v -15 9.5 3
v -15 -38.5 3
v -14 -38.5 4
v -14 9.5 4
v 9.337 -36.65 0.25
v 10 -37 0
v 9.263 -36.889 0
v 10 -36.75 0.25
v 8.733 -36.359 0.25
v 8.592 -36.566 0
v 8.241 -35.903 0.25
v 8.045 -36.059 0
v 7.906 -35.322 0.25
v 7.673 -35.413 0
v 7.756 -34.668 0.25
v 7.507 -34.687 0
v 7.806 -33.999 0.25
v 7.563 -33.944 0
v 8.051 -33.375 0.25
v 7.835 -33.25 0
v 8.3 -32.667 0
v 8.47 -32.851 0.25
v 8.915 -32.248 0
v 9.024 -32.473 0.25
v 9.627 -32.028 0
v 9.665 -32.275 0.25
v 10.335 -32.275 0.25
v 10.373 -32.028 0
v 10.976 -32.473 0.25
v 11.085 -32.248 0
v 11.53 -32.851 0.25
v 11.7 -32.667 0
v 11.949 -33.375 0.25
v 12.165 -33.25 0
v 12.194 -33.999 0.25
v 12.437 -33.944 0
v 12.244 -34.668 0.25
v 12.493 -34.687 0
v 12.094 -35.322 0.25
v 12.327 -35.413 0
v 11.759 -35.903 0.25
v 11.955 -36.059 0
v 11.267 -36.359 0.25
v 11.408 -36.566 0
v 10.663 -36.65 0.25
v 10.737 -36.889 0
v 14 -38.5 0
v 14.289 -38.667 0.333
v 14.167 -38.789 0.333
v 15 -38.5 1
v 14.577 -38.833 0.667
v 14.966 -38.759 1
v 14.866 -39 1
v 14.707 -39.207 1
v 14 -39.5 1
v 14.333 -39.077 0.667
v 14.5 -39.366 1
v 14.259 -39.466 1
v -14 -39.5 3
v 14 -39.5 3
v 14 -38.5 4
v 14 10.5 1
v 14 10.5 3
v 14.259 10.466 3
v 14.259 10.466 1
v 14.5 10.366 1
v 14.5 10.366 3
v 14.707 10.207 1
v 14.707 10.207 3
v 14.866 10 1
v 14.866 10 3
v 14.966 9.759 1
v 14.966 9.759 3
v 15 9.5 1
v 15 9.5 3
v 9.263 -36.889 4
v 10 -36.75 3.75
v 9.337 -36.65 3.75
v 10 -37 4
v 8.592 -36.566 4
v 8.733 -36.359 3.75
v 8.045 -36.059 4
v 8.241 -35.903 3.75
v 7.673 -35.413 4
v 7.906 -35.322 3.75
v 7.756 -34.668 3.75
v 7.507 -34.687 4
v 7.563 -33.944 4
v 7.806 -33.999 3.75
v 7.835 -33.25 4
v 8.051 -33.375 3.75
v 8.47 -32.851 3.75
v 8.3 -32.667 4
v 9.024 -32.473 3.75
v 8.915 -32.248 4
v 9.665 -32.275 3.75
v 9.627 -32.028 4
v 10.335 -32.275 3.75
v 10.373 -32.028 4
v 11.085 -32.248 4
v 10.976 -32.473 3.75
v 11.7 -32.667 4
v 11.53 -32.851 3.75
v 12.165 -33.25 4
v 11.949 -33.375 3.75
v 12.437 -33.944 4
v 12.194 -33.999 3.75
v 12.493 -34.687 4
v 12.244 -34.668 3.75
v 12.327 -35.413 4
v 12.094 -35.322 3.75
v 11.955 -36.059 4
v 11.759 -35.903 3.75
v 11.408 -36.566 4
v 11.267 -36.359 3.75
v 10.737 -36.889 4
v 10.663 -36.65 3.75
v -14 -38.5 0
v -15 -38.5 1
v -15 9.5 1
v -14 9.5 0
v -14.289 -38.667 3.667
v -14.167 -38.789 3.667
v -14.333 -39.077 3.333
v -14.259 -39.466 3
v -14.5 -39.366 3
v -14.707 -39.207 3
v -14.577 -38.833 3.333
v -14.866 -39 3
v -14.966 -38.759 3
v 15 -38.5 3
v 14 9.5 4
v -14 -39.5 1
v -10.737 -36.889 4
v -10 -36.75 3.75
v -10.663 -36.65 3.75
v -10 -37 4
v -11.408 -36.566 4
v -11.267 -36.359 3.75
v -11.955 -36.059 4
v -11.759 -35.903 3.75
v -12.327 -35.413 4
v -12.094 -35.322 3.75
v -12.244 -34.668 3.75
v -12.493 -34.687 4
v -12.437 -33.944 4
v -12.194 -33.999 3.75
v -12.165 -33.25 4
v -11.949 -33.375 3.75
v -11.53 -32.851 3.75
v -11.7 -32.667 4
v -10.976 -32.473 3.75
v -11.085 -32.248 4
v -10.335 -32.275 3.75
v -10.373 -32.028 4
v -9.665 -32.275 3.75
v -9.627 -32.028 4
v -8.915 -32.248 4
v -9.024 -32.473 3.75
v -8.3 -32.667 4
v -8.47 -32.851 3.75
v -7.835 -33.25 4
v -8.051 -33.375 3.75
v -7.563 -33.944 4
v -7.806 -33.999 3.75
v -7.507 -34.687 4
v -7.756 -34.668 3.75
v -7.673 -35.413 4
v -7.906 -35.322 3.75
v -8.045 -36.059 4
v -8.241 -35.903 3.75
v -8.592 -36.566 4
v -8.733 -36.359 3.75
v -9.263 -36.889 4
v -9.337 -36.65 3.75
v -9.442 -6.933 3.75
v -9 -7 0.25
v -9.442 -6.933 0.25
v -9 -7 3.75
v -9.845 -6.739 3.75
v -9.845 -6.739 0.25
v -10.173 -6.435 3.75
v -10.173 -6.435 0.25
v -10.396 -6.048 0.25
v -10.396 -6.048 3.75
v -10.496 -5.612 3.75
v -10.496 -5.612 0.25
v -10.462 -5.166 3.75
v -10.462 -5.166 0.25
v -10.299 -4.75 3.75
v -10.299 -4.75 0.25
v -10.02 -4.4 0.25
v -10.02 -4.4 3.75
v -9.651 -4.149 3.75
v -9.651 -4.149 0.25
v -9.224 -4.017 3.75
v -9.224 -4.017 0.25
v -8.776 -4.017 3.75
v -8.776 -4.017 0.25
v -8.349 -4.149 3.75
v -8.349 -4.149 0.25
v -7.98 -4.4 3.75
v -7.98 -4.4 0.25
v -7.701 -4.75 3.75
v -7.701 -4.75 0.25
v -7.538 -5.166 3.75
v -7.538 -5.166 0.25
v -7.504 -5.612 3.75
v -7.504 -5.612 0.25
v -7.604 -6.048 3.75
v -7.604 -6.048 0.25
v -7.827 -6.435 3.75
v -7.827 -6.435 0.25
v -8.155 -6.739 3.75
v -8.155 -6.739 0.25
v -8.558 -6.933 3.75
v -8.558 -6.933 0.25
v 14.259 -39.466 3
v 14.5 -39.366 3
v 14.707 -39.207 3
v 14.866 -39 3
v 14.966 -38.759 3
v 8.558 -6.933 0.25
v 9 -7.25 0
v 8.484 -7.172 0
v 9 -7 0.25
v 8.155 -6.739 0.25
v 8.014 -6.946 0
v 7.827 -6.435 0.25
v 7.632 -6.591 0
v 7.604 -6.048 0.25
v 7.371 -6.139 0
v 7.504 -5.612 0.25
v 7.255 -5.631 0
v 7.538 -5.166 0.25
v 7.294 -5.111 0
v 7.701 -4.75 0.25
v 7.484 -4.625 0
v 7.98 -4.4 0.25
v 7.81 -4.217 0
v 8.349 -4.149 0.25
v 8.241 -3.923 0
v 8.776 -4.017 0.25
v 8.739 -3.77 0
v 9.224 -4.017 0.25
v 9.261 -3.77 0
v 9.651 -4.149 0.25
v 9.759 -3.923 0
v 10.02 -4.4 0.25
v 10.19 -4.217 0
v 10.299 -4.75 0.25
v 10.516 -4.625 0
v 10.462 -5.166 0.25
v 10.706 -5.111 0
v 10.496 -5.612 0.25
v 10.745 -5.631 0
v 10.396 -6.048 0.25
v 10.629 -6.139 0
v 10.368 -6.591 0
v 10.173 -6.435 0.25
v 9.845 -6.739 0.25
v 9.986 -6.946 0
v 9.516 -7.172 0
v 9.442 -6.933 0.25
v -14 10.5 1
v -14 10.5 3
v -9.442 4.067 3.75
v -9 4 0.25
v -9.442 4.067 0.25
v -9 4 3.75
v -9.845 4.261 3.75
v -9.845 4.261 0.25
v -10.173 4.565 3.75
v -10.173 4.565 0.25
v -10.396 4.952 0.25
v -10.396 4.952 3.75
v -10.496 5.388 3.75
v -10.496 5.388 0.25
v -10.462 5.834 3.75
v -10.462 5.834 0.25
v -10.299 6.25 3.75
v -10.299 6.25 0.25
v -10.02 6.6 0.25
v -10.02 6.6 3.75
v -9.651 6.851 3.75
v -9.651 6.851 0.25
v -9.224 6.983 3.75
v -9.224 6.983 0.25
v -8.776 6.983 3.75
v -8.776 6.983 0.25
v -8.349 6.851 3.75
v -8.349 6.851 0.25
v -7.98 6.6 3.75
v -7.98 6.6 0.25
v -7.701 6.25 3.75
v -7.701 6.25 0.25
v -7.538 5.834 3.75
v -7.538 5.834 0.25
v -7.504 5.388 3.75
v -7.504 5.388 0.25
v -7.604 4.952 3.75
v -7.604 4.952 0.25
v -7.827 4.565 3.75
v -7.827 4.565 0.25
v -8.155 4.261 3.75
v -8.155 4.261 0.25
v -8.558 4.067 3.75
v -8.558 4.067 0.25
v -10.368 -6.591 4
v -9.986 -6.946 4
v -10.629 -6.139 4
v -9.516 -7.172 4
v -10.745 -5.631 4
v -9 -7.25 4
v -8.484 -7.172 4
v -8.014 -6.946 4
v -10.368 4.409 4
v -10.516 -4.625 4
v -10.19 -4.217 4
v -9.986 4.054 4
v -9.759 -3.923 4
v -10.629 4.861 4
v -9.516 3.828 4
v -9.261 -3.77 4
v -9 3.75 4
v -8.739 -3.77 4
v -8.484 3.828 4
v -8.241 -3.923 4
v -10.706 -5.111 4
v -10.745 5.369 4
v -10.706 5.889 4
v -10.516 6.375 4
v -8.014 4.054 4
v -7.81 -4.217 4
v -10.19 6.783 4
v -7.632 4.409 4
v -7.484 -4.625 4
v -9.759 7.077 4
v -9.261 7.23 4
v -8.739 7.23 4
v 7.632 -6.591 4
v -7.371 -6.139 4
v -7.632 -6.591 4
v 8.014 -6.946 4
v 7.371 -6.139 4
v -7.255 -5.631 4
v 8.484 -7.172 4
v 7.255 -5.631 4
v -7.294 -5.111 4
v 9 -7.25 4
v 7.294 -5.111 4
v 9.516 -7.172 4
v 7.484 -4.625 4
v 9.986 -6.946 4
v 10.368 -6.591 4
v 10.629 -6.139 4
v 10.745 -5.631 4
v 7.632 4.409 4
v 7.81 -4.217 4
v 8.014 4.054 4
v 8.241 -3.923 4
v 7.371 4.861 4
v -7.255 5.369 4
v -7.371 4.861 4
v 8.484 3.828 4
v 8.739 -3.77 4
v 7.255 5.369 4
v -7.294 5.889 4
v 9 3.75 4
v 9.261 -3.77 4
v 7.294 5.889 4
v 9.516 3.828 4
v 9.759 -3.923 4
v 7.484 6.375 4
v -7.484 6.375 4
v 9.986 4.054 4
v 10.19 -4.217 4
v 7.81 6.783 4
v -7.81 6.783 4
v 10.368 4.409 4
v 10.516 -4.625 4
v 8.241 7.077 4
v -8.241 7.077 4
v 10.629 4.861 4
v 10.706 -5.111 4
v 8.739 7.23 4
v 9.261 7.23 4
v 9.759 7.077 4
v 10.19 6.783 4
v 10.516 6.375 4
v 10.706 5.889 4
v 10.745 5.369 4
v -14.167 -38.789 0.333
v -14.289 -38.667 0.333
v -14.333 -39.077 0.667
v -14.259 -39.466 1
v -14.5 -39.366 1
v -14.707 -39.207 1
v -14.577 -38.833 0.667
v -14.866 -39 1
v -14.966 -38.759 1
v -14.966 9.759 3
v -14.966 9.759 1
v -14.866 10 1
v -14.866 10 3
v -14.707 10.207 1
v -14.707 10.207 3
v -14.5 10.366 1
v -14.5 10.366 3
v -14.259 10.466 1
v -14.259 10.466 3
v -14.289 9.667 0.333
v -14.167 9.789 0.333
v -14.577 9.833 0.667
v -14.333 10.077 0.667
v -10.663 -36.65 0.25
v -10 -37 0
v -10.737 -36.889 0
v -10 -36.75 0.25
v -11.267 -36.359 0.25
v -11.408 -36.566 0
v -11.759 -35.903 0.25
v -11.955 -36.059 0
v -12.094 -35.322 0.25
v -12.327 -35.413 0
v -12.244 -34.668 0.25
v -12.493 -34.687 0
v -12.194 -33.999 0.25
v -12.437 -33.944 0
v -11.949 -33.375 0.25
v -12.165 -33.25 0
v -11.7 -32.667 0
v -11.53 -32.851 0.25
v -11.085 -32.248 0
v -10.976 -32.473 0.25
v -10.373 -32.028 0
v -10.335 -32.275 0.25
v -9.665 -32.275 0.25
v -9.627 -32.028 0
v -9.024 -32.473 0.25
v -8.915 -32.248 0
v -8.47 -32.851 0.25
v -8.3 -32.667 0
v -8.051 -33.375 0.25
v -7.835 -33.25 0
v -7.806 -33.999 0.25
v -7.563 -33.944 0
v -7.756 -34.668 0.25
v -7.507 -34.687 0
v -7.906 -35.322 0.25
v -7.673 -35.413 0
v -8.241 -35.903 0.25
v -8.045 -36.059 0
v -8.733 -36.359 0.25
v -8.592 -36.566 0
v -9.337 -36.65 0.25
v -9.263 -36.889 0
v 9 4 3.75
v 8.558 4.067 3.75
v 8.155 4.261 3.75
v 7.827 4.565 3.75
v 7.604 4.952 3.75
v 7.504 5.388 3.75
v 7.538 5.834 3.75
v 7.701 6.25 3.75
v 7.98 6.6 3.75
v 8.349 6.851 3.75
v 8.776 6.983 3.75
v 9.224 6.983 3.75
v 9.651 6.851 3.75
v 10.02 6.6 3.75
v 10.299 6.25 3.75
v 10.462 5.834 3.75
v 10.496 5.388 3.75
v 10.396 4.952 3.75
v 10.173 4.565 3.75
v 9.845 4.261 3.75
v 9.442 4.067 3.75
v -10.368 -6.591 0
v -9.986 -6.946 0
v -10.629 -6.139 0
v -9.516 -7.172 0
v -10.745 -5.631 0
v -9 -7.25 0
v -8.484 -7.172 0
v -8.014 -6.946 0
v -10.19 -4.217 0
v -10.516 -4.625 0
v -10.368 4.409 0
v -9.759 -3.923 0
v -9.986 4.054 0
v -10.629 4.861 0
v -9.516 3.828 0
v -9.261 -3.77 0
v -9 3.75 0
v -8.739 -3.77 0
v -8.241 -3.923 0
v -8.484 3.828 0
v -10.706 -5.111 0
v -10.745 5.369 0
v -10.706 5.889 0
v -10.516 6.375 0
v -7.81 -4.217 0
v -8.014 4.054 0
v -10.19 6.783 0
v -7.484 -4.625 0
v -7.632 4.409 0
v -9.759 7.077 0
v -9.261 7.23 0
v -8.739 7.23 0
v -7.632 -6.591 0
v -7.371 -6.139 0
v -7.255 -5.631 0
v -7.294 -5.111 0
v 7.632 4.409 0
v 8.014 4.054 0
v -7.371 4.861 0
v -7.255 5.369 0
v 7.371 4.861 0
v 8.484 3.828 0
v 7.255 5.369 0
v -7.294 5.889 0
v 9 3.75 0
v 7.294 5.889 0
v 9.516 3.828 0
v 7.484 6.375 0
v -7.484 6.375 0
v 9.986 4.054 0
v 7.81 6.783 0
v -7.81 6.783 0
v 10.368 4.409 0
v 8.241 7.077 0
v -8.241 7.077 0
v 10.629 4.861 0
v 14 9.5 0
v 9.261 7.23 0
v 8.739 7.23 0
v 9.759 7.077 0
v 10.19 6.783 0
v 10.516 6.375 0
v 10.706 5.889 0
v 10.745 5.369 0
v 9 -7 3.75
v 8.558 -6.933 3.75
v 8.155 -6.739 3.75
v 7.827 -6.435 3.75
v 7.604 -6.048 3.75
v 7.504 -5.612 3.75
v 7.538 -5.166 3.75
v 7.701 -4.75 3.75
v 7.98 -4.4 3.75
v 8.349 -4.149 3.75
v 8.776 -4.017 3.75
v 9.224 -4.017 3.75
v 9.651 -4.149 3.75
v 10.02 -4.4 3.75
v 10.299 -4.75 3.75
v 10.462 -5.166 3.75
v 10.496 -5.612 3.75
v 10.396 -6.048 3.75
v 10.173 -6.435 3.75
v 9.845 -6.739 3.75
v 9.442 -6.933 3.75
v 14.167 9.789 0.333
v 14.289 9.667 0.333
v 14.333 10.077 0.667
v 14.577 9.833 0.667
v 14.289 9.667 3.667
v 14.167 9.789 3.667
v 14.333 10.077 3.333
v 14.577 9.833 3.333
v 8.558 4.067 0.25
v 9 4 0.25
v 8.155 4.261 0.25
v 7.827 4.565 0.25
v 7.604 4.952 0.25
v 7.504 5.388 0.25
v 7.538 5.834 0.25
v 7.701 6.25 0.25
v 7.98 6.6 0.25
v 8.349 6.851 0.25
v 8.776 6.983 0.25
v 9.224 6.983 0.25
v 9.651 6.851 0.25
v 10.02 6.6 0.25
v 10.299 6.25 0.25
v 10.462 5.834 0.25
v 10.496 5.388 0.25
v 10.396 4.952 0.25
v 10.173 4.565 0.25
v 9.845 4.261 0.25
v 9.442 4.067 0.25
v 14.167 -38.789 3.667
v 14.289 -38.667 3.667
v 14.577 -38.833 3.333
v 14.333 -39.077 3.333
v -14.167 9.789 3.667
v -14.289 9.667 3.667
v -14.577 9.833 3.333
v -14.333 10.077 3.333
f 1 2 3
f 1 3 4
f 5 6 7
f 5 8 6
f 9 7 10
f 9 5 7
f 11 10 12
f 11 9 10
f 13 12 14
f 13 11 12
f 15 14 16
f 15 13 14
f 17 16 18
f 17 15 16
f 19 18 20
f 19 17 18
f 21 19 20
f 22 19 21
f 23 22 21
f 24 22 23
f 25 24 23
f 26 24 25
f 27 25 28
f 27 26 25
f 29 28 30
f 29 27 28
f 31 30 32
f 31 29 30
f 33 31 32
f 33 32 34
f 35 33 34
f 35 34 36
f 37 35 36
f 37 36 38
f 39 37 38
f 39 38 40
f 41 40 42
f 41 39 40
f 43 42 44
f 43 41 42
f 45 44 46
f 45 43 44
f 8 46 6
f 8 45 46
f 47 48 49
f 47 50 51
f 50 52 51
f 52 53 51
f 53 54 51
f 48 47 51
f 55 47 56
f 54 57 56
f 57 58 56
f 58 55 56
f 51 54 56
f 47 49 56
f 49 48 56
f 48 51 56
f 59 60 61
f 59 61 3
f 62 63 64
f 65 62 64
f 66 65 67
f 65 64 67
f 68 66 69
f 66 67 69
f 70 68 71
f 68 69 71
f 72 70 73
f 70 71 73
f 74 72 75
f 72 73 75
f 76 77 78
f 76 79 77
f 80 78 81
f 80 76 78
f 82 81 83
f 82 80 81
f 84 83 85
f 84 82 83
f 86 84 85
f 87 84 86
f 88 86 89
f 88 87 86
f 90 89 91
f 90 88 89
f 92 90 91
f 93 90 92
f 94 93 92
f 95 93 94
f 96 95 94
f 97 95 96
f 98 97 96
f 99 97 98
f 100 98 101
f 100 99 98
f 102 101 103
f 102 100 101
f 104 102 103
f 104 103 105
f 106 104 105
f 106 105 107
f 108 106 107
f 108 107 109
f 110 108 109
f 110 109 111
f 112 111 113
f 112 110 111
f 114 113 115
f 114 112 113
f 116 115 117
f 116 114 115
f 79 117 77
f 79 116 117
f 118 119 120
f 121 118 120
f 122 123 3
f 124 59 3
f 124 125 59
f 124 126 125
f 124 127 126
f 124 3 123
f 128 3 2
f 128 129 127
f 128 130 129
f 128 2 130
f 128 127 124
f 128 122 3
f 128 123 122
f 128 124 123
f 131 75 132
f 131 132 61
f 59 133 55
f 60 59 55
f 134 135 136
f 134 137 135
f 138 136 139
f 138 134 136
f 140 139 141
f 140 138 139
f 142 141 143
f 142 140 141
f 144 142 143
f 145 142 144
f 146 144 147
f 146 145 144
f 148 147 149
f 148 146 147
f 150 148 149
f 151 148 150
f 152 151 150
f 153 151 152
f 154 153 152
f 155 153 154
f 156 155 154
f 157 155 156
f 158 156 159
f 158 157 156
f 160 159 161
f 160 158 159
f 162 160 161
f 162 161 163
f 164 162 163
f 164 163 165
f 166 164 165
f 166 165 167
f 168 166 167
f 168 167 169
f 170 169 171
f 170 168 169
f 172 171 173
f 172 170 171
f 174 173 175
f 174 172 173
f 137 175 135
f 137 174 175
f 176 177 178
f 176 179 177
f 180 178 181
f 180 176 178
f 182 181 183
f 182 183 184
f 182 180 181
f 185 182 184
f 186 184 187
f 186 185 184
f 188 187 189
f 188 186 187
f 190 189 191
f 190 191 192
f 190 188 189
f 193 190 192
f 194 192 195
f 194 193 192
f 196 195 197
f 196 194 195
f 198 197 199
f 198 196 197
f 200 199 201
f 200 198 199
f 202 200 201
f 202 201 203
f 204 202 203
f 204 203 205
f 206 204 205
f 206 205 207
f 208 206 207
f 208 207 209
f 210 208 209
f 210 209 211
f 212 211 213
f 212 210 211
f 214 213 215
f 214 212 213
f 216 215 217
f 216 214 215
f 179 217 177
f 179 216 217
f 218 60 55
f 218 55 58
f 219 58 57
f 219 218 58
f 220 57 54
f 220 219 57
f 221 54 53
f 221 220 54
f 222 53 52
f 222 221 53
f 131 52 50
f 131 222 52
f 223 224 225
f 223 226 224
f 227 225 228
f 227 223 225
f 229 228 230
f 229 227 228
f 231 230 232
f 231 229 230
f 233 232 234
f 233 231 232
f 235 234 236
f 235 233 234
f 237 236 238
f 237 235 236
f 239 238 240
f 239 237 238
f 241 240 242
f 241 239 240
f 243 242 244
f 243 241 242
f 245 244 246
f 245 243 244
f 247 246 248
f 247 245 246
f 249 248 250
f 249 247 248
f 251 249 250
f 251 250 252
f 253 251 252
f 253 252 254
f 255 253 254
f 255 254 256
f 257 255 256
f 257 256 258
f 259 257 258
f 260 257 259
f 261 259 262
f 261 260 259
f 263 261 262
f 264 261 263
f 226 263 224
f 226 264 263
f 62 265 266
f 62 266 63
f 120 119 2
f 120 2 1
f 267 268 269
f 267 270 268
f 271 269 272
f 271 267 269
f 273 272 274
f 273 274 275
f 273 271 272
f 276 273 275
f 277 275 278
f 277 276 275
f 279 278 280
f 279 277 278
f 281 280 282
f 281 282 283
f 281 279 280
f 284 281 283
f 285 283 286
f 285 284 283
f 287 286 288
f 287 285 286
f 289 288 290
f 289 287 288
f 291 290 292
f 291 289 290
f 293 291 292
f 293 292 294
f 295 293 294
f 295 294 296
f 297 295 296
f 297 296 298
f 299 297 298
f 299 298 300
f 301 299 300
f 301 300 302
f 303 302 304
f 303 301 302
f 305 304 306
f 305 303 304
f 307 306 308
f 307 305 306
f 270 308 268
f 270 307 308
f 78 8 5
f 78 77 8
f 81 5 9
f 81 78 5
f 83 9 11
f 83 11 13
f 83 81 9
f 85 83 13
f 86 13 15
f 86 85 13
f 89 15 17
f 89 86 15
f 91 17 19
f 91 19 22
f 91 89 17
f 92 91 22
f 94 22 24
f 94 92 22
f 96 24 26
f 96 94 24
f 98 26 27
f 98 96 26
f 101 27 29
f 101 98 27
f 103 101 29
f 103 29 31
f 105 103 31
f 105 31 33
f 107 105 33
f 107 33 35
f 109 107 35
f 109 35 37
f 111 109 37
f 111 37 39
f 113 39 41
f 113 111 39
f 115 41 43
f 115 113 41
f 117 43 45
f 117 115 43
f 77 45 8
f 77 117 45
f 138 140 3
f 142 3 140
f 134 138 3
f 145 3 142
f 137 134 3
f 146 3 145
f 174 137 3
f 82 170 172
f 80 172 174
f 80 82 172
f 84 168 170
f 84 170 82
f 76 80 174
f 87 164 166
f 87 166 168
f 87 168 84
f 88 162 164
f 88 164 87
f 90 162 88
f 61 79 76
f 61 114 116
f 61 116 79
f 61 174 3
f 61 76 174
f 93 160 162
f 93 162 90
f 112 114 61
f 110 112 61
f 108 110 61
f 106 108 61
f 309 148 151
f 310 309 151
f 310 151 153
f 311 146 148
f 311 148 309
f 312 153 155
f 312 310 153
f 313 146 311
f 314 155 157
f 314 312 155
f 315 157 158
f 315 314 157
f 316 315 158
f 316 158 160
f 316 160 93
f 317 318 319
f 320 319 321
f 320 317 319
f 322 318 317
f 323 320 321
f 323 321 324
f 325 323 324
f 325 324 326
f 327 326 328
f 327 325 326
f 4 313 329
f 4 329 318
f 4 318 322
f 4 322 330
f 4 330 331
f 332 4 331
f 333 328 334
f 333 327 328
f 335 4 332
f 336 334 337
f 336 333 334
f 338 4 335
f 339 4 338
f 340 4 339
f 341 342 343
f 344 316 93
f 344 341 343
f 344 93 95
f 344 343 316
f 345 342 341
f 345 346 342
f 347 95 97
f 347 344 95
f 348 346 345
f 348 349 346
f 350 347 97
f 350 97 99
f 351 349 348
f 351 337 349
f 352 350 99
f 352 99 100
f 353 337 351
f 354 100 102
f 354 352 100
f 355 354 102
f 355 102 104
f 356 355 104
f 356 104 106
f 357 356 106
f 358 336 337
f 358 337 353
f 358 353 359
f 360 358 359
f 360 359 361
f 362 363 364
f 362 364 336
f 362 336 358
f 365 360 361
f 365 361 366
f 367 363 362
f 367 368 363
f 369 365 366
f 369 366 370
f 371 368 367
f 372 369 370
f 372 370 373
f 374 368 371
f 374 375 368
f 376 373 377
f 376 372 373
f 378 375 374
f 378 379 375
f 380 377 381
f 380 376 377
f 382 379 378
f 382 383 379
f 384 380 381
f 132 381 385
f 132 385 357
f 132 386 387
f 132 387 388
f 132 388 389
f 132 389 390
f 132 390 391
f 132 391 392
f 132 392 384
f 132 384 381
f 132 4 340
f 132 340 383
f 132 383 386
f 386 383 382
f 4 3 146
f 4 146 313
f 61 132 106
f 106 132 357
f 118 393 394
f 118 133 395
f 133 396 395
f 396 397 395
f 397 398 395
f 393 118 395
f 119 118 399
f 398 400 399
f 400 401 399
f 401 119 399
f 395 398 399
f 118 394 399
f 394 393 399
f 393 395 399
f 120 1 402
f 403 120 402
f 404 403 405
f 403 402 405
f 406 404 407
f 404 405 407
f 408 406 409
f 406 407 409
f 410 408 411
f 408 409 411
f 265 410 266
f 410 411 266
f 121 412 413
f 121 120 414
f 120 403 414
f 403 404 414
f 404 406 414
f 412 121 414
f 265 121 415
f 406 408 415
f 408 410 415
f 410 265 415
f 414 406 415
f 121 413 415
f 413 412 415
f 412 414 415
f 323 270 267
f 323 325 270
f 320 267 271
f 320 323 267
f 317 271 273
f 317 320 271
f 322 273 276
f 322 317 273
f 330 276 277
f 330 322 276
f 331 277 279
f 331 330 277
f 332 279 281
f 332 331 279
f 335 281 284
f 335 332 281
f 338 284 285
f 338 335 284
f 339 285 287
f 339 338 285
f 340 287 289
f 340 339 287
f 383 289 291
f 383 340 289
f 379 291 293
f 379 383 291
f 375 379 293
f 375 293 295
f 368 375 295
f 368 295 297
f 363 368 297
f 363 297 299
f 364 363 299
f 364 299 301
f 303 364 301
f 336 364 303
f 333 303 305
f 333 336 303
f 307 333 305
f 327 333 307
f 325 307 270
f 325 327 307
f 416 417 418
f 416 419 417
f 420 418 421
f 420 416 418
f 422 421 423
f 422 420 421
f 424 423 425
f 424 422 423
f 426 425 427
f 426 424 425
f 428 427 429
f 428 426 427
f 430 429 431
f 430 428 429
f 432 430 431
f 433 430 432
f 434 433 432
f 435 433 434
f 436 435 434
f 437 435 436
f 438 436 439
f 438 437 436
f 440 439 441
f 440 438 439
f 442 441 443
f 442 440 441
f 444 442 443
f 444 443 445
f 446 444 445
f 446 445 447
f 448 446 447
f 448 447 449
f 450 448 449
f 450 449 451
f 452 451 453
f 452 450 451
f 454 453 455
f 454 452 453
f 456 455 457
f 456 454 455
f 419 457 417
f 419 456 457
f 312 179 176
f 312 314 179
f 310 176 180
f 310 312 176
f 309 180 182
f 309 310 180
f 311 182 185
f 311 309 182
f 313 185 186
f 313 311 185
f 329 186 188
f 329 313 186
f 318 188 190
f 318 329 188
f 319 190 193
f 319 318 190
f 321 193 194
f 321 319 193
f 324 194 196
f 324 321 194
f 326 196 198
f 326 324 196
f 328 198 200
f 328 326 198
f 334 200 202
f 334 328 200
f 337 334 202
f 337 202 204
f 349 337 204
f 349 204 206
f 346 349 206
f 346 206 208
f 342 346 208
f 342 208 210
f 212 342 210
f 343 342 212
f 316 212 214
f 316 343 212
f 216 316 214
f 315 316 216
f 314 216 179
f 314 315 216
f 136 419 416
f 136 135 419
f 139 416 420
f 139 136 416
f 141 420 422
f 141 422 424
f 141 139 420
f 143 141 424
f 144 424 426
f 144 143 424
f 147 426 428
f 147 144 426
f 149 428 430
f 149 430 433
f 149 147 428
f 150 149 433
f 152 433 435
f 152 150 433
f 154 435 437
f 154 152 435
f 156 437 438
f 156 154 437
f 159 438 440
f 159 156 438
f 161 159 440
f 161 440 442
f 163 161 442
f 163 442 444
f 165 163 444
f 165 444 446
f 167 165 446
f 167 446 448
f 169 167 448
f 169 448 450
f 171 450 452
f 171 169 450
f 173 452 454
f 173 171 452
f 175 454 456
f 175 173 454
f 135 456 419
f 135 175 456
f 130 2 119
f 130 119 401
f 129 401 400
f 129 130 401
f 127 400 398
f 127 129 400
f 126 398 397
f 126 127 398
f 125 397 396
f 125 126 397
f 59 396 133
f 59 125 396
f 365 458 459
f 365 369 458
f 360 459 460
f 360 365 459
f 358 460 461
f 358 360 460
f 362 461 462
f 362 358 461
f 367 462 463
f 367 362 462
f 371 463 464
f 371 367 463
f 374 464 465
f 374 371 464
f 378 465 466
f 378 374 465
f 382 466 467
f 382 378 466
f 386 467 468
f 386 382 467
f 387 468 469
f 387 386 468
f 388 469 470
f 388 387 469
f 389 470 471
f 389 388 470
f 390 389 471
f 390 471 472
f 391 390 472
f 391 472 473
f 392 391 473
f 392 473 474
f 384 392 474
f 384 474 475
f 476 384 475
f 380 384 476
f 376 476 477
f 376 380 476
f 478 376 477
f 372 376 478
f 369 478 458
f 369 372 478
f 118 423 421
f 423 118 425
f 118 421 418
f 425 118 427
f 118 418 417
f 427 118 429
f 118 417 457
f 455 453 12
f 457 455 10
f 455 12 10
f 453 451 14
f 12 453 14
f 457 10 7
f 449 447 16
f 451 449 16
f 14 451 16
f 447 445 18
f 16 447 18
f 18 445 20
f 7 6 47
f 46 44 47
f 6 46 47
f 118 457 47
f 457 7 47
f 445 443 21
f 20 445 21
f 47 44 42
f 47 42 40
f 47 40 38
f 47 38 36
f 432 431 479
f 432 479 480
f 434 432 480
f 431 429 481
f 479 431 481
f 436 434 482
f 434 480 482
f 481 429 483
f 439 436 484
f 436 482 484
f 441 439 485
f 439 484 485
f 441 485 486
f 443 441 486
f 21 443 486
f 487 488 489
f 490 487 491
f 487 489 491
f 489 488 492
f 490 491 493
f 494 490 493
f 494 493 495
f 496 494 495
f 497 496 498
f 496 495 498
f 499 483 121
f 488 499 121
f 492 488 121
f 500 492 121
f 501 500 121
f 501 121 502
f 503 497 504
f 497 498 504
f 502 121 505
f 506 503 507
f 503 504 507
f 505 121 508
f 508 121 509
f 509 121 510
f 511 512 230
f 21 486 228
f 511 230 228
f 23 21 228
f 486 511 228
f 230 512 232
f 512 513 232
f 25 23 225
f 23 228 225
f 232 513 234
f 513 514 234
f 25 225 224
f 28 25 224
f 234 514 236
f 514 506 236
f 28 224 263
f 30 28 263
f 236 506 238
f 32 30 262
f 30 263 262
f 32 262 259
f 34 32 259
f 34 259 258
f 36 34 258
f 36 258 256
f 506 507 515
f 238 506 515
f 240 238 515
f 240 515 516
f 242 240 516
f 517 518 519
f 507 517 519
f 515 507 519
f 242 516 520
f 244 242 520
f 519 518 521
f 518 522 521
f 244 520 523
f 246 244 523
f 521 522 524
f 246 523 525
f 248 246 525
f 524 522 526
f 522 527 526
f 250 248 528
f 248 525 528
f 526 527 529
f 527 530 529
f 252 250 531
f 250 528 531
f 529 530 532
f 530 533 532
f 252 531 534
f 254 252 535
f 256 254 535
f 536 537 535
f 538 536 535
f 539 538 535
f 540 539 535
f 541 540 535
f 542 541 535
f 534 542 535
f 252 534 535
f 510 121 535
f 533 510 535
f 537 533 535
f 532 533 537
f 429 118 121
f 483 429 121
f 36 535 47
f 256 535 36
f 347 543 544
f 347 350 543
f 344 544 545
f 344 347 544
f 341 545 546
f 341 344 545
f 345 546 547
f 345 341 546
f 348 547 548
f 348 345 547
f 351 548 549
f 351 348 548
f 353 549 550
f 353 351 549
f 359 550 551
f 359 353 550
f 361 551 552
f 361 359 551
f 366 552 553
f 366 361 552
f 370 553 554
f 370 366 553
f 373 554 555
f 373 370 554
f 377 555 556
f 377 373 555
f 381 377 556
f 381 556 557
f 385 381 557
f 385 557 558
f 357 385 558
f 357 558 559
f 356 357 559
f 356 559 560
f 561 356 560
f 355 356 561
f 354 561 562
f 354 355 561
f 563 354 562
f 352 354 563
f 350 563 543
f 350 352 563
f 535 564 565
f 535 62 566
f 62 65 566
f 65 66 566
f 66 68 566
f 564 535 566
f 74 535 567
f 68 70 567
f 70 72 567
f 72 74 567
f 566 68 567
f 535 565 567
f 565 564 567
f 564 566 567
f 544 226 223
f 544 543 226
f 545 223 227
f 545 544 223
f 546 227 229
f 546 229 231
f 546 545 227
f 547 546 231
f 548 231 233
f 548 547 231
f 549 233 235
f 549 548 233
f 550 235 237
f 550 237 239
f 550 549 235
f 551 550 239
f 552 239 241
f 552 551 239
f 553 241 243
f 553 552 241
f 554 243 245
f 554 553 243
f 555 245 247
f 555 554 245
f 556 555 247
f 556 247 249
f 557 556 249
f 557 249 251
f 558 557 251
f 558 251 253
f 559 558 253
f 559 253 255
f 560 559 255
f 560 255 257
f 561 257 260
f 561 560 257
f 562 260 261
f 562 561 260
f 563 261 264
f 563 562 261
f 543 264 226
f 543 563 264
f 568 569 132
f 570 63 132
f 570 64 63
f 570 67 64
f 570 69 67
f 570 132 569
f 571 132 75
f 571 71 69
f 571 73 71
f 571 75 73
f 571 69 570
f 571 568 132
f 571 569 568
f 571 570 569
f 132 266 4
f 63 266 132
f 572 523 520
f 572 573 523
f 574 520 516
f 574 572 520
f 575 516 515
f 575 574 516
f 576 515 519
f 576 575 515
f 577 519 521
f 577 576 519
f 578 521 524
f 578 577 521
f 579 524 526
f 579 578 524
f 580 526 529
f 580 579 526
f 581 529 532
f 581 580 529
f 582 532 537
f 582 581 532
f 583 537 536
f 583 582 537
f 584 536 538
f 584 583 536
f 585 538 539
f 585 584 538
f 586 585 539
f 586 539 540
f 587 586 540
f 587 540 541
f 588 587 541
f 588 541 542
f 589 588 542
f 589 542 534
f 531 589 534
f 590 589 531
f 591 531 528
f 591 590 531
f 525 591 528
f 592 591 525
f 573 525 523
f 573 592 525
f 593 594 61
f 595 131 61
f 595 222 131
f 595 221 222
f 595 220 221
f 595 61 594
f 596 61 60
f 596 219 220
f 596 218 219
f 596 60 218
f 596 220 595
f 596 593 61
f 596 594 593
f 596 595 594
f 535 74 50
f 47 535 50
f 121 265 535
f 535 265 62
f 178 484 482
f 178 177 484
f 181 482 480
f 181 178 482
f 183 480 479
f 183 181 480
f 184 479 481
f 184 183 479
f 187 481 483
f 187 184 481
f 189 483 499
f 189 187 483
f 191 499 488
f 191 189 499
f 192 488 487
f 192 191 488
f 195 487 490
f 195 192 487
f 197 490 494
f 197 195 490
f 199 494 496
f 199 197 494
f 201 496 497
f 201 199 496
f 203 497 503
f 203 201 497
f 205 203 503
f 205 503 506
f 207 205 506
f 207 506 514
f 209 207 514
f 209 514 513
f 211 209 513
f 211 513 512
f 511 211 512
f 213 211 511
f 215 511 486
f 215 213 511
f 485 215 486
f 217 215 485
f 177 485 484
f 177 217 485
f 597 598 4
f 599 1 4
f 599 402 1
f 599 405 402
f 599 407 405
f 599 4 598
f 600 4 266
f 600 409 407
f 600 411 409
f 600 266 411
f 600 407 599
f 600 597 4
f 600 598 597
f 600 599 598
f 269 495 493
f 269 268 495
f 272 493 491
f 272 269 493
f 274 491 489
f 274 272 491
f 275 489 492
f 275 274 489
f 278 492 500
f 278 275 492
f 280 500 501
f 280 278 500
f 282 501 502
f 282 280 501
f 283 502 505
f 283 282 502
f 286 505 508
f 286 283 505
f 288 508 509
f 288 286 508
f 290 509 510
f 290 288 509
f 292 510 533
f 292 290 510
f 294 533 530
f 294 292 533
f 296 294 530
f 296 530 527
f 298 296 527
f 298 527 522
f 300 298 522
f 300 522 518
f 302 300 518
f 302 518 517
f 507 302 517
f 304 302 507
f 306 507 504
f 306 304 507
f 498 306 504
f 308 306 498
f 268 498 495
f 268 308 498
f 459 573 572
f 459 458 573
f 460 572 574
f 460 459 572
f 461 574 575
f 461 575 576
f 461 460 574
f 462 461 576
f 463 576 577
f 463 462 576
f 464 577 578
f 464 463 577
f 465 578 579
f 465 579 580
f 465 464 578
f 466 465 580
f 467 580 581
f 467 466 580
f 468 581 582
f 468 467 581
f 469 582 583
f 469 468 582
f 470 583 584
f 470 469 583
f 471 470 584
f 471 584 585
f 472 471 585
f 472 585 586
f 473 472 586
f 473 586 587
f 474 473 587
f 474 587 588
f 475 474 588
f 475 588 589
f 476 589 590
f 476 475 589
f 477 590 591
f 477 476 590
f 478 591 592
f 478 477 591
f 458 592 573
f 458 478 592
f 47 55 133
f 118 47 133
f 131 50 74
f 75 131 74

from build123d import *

# Parameters (mm, degrees)
SKETCH1_W                      = 30
SKETCH1_H                      = 50
BOSS_EXTRUDE1_DEPTH            = 4
F_3_0MM_DOWEL_HOLE1_AT_2_COUNT = 2
F_3_0MM_DOWEL_HOLE1_AT_2_PITCH = 11
F_3_0MM_DOWEL_HOLE1_AT_3_COUNT = 2
F_3_0MM_DOWEL_HOLE1_AT_3_PITCH = 21.09502311
F_3_0MM_DOWEL_HOLE1_AT_4_COUNT = 2
F_3_0MM_DOWEL_HOLE1_AT_4_PITCH = 18
M4_CLEARANCE_HOLE1_AT_2_COUNT  = 2
M4_CLEARANCE_HOLE1_AT_2_PITCH  = 20
FILLET1_R                      = 1
CHAMFER1_SIZE                  = 1


with BuildPart() as part:
    # Sketch1 → Boss-Extrude1 (new body)
    with BuildSketch(Plane.XY):
        with Locations((0, -14.5)):
            Rectangle(SKETCH1_W, SKETCH1_H)
    extrude(amount=BOSS_EXTRUDE1_DEPTH)

    # Sketch5 → Ø3.0mm Dowel Hole1 (revolve, cut)
    with BuildSketch(Plane(origin=(-9, 5.5, 4), x_dir=(0, -1, 0), z_dir=(1, 0, 0))):
        Polygon((0, 0), (0, 4), (1.75, 4), (1.5, 3.75), (1.5, 0.25), (1.75, 0), align=None)
    f_3_0mm_dowel_hole1 = revolve(axis=Axis((-9, 5.5, 10.35), (0, 0, -1)), mode=Mode.SUBTRACT)

    # Ø3.0mm Dowel Hole1 at 2: Ø3.0mm Dowel Hole1 ×2
    with Locations(*[(0, -i * F_3_0MM_DOWEL_HOLE1_AT_2_PITCH, 0) for i in range(1, F_3_0MM_DOWEL_HOLE1_AT_2_COUNT)]):
        add(f_3_0mm_dowel_hole1, mode=Mode.SUBTRACT)

    # Ø3.0mm Dowel Hole1 at 3: Ø3.0mm Dowel Hole1 ×2
    with Locations(*[Vector(0.8532818336519591, -0.521450009453975, 0) * (i * F_3_0MM_DOWEL_HOLE1_AT_3_PITCH) for i in range(1, F_3_0MM_DOWEL_HOLE1_AT_3_COUNT)]):
        add(f_3_0mm_dowel_hole1, mode=Mode.SUBTRACT)

    # Ø3.0mm Dowel Hole1 at 4: Ø3.0mm Dowel Hole1 ×2
    with Locations(*[(i * F_3_0MM_DOWEL_HOLE1_AT_4_PITCH, 0, 0) for i in range(1, F_3_0MM_DOWEL_HOLE1_AT_4_COUNT)]):
        add(f_3_0mm_dowel_hole1, mode=Mode.SUBTRACT)

    # Sketch8 → M4 Clearance Hole1 (revolve, cut)
    with BuildSketch(Plane(origin=(-10, -34.5, 4), x_dir=(0, -1, 0), z_dir=(1, 0, 0))):
        Polygon((0, 0), (0, 4), (2.5, 4), (2.25, 3.75), (2.25, 0.25), (2.5, 0), align=None)
    m4_clearance_hole1 = revolve(axis=Axis((-10, -34.5, 10.35), (0, 0, -1)), mode=Mode.SUBTRACT)

    # M4 Clearance Hole1 at 2: M4 Clearance Hole1 ×2
    with Locations(*[(i * M4_CLEARANCE_HOLE1_AT_2_PITCH, 0, 0) for i in range(1, M4_CLEARANCE_HOLE1_AT_2_COUNT)]):
        add(m4_clearance_hole1, mode=Mode.SUBTRACT)

    # Fillet1
    fillet1_edges = [part.edges().sort_by_distance(p)[0] for p in [
        (15, 10.5, 2),
        (15, -39.5, 2),
        (-15, -39.5, 2),
        (-15, 10.5, 2),
    ]]
    fillet(fillet1_edges, radius=FILLET1_R)

    # Chamfer1
    chamfer1_edges = [part.edges().sort_by_distance(p)[0] for p in [
        (0, -39.5, 0),
        (14.707106781, -39.207106781, 0),
        (-14.707106781, -39.207106781, 0),
        (15, -14.5, 0),
        (-15, -14.5, 0),
        (14.707106781, 10.207106781, 0),
        (-14.707106781, 10.207106781, 0),
        (0, 10.5, 0),
        (0, -39.5, 4),
        (14.707106781, -39.207106781, 4),
        (-14.707106781, -39.207106781, 4),
        (15, -14.5, 4),
        (-15, -14.5, 4),
        (14.707106781, 10.207106781, 4),
        (-14.707106781, 10.207106781, 4),
        (0, 10.5, 4),
    ]]
    chamfer(chamfer1_edges, length=CHAMFER1_SIZE)


solid = part.part
